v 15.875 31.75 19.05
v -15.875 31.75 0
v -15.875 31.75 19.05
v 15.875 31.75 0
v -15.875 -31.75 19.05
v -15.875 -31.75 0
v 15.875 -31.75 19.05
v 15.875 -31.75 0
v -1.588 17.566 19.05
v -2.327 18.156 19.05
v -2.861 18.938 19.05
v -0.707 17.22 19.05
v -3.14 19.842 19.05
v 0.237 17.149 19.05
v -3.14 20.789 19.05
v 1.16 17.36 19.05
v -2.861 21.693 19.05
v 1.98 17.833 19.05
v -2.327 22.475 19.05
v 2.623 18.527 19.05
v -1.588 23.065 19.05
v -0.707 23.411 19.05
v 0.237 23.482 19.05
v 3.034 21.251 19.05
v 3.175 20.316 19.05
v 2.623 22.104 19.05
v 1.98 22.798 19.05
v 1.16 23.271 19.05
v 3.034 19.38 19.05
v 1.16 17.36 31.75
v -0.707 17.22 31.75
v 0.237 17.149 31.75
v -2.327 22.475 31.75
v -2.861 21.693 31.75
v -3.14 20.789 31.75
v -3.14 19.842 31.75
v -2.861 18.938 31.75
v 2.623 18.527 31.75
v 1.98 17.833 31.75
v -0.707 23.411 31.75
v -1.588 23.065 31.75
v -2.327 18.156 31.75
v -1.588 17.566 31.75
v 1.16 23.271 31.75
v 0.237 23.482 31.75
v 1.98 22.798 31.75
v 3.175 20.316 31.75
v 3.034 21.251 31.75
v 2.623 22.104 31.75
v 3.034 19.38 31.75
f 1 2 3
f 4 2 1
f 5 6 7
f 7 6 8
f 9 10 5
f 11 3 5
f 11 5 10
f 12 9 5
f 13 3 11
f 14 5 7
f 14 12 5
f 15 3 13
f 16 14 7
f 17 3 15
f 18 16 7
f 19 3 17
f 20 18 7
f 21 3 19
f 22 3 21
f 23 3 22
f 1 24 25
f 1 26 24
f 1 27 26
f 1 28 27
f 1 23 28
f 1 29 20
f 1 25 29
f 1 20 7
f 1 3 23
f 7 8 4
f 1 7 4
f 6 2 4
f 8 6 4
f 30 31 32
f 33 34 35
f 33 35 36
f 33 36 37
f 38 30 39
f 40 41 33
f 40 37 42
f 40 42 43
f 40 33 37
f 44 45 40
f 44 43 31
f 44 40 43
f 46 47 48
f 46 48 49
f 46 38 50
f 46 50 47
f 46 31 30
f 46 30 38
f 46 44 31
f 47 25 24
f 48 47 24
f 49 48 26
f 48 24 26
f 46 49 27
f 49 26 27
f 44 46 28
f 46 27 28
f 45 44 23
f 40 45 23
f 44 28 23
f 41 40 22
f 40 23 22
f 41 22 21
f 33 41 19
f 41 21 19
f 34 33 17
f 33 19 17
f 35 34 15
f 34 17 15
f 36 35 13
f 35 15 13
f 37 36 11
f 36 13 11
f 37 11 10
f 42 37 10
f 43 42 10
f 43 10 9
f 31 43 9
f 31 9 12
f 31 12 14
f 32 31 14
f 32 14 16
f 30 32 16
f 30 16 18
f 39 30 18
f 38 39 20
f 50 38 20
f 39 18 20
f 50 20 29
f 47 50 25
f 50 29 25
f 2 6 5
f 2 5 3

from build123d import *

# Parameters (mm, degrees)
SKETCH1_W           = 31.75
SKETCH1_H           = 63.5
BOSS_EXTRUDE1_DEPTH = 19.05
SKETCH2_R           = 3.175
BOSS_EXTRUDE2_DEPTH = 12.7


with BuildPart() as part:
    # Sketch1 → Boss-Extrude1 (new body)
    with BuildSketch(Plane.XY):
        Rectangle(SKETCH1_W, SKETCH1_H)
    extrude(amount=BOSS_EXTRUDE1_DEPTH)

    # Sketch2 → Boss-Extrude2 (add)
    with BuildSketch(Plane.XY.offset(19.05)):
        with Locations((0, 20.315619897)):
            Circle(SKETCH2_R)
    extrude(amount=BOSS_EXTRUDE2_DEPTH)


solid = part.part
